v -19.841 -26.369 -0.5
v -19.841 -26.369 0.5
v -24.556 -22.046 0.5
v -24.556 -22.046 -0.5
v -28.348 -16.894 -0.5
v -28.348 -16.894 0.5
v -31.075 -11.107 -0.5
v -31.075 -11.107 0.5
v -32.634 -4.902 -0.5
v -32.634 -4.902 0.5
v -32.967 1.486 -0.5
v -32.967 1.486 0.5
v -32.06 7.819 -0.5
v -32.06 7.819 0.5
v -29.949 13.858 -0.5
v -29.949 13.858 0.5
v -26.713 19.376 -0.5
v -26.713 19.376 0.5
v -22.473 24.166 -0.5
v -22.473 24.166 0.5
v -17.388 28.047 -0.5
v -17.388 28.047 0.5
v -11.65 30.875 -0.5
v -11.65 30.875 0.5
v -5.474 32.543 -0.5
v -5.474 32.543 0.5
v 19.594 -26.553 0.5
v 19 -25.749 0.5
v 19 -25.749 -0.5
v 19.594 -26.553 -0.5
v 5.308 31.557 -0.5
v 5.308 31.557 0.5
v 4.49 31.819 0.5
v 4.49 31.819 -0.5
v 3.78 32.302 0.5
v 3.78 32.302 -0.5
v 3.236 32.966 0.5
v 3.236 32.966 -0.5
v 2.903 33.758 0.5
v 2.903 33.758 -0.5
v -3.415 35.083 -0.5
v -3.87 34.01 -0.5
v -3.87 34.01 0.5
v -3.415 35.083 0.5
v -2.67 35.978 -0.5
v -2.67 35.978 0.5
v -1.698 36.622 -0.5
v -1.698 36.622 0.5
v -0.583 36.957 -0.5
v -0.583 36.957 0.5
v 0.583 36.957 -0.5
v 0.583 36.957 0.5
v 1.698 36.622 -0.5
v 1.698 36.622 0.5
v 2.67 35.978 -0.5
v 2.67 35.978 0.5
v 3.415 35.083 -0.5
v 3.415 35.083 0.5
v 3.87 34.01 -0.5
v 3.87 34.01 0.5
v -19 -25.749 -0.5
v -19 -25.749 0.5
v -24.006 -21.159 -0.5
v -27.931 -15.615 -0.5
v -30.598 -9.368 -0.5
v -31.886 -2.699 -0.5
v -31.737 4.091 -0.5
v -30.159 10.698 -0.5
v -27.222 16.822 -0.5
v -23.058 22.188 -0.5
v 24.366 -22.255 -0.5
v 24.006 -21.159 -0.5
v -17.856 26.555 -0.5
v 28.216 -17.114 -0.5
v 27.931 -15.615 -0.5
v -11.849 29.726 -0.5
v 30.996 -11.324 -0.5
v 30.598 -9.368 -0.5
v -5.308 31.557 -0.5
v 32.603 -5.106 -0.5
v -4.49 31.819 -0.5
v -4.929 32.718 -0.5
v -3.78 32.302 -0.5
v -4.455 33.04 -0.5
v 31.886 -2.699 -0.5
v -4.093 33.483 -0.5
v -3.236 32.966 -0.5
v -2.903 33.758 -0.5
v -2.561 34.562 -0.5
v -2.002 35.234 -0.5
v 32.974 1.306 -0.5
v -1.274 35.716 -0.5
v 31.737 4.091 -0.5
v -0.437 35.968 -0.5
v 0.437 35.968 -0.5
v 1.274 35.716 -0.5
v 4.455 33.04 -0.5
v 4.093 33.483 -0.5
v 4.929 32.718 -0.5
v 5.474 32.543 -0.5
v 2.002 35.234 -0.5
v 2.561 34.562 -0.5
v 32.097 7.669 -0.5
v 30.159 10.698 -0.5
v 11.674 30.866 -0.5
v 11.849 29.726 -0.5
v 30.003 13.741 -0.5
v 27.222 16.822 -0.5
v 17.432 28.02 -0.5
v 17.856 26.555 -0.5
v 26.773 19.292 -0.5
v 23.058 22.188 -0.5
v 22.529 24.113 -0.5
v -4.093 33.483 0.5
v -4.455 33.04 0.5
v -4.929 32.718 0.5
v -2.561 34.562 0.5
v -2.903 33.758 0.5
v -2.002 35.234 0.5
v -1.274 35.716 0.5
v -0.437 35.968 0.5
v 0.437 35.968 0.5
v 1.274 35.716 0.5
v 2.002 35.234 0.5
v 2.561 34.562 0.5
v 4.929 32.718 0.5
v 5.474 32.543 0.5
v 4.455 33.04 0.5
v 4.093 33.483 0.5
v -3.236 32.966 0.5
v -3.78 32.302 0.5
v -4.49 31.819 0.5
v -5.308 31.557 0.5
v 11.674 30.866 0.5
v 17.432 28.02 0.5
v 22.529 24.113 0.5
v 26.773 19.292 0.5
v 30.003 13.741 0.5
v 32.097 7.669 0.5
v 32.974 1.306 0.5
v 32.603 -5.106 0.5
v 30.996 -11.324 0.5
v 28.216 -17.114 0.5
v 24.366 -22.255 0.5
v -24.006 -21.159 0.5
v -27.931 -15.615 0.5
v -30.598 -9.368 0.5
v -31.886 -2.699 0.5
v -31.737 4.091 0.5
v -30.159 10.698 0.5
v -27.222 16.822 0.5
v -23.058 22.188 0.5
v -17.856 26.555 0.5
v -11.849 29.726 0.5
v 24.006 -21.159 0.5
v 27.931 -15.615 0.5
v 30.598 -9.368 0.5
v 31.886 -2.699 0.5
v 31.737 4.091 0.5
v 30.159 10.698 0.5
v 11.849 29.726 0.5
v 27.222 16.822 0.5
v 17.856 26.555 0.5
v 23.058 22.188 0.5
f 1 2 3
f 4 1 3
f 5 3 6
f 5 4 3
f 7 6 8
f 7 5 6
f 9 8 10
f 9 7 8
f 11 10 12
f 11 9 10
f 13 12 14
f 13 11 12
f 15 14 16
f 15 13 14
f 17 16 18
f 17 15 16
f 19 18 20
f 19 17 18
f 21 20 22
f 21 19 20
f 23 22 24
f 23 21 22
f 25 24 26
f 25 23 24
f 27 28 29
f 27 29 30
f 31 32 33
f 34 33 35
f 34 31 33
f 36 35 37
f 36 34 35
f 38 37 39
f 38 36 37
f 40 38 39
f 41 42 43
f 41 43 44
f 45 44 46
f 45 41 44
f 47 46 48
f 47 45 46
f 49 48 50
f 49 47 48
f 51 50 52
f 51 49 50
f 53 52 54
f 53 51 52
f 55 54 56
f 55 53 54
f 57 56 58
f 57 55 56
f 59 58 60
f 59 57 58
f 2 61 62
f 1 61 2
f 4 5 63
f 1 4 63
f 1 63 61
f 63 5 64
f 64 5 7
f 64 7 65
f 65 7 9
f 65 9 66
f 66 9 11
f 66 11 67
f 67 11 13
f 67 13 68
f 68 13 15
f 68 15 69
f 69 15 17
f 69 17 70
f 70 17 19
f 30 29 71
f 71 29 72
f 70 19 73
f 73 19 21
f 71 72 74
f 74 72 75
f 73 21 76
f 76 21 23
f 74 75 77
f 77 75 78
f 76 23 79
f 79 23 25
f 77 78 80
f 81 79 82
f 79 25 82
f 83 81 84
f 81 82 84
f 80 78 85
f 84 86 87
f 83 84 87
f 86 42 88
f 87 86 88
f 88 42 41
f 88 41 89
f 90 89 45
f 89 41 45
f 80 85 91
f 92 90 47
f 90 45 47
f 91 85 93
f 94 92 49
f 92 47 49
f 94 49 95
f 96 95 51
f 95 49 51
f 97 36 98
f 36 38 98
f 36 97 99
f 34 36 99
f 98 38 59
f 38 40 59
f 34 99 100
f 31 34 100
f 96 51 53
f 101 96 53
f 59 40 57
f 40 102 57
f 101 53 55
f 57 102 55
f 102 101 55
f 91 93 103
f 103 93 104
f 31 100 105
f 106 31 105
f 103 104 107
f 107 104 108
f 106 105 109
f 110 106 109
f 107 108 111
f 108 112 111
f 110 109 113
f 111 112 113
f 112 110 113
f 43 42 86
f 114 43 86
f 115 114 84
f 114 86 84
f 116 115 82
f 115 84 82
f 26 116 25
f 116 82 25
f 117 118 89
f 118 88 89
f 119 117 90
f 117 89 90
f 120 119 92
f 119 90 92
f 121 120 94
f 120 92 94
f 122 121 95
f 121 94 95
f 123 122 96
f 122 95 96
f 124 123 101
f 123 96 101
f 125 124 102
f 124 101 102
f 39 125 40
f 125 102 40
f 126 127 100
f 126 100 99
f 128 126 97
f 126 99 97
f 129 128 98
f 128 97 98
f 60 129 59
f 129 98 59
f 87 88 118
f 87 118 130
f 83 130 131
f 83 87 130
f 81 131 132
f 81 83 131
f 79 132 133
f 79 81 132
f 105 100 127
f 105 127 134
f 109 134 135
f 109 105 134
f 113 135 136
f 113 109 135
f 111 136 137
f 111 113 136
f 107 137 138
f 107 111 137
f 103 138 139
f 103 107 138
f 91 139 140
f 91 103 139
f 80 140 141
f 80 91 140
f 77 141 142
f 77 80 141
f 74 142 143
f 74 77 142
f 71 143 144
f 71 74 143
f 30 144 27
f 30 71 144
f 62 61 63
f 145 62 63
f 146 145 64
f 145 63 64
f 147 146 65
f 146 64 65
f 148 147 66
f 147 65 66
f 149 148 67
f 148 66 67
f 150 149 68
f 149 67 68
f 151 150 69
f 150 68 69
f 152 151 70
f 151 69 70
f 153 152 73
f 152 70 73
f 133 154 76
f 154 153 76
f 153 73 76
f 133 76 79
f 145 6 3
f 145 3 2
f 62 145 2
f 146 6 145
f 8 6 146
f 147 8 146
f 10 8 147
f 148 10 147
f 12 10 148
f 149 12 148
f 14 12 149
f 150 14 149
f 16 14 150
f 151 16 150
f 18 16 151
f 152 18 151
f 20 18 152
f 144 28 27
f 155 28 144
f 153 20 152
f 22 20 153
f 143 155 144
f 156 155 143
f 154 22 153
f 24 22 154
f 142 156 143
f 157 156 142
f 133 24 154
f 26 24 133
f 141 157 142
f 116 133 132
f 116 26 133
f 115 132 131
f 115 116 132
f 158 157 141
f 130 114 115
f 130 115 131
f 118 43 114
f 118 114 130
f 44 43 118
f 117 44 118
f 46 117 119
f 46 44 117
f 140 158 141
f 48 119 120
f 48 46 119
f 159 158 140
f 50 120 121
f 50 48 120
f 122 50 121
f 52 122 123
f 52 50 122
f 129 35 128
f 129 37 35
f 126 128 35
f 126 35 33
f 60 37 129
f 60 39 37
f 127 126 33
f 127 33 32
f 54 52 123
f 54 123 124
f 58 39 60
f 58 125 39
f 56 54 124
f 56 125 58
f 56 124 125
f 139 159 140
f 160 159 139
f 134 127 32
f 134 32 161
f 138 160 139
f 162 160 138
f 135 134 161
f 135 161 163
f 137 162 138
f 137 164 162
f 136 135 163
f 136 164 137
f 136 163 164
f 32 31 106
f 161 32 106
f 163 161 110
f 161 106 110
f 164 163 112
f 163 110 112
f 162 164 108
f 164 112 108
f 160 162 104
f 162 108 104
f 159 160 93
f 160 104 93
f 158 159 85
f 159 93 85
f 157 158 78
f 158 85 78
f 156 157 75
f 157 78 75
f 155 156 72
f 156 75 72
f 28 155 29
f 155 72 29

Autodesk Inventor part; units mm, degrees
ref_plane "YZ Plane" through (0, 0, 0) normal (1, 0, 0) x (0, 1, 0)
ref_plane "XZ Plane" through (0, 0, 0) normal (0, 1, 0) x (-1, 0, 0)
ref_plane "XY Plane" through (0, 0, 0) normal (0, 0, 1) x (1, 0, 0)
sketch "Эскиз1" plane through (0, 0, 0) normal (0, 0, 1) x (1, 0, 0)
  circle A0 centre (0, 0) radius 33
  circle A1 centre (0, 0) radius 32
  arc A2 (-5.4738, 32.5429) -> (-3.8704, 34.0101) centre (-5.8055, 34.5152) ccw
  arc A3 (3.8704, 34.0101) -> (-3.8704, 34.0101) centre (0, 33) ccw
  arc A4 (3.8704, 34.0101) -> (5.4738, 32.5429) centre (5.8055, 34.5152) ccw
  line L0 (-19, -25.7488) -> (19, -25.7488) construction
  line L1 (-19, -25.7488) -> (-19.8409, -26.3693)
  line L2 (19, -25.7488) -> (19.5938, -26.5534)
  arc A5 (-5.3079, 31.5567) -> (-2.9028, 33.7576) centre (-5.8055, 34.5152) ccw
  arc A6 (2.9028, 33.7576) -> (-2.9028, 33.7576) centre (0, 33) ccw
  arc A7 (2.9028, 33.7576) -> (5.3079, 31.5567) centre (5.8055, 34.5152) ccw
  point P0 (5.3079, 31.5567)
  point P1 (-5.3079, 31.5567)
  dimension "d0" = 66
  dimension "d1" = 64
  dimension "d2" = 4
  dimension "d4" = 2
  dimension "d5" = 38
extrude "Выдавливание1" add sketch "Эскиз1" along normal mid plane 1 contours A0 L2 A1 A7 | A0 A7 A6 A5 A2 A3 A4 | A0 A5 A1 L1
properties part number "69. Пружина синхронизатора"
